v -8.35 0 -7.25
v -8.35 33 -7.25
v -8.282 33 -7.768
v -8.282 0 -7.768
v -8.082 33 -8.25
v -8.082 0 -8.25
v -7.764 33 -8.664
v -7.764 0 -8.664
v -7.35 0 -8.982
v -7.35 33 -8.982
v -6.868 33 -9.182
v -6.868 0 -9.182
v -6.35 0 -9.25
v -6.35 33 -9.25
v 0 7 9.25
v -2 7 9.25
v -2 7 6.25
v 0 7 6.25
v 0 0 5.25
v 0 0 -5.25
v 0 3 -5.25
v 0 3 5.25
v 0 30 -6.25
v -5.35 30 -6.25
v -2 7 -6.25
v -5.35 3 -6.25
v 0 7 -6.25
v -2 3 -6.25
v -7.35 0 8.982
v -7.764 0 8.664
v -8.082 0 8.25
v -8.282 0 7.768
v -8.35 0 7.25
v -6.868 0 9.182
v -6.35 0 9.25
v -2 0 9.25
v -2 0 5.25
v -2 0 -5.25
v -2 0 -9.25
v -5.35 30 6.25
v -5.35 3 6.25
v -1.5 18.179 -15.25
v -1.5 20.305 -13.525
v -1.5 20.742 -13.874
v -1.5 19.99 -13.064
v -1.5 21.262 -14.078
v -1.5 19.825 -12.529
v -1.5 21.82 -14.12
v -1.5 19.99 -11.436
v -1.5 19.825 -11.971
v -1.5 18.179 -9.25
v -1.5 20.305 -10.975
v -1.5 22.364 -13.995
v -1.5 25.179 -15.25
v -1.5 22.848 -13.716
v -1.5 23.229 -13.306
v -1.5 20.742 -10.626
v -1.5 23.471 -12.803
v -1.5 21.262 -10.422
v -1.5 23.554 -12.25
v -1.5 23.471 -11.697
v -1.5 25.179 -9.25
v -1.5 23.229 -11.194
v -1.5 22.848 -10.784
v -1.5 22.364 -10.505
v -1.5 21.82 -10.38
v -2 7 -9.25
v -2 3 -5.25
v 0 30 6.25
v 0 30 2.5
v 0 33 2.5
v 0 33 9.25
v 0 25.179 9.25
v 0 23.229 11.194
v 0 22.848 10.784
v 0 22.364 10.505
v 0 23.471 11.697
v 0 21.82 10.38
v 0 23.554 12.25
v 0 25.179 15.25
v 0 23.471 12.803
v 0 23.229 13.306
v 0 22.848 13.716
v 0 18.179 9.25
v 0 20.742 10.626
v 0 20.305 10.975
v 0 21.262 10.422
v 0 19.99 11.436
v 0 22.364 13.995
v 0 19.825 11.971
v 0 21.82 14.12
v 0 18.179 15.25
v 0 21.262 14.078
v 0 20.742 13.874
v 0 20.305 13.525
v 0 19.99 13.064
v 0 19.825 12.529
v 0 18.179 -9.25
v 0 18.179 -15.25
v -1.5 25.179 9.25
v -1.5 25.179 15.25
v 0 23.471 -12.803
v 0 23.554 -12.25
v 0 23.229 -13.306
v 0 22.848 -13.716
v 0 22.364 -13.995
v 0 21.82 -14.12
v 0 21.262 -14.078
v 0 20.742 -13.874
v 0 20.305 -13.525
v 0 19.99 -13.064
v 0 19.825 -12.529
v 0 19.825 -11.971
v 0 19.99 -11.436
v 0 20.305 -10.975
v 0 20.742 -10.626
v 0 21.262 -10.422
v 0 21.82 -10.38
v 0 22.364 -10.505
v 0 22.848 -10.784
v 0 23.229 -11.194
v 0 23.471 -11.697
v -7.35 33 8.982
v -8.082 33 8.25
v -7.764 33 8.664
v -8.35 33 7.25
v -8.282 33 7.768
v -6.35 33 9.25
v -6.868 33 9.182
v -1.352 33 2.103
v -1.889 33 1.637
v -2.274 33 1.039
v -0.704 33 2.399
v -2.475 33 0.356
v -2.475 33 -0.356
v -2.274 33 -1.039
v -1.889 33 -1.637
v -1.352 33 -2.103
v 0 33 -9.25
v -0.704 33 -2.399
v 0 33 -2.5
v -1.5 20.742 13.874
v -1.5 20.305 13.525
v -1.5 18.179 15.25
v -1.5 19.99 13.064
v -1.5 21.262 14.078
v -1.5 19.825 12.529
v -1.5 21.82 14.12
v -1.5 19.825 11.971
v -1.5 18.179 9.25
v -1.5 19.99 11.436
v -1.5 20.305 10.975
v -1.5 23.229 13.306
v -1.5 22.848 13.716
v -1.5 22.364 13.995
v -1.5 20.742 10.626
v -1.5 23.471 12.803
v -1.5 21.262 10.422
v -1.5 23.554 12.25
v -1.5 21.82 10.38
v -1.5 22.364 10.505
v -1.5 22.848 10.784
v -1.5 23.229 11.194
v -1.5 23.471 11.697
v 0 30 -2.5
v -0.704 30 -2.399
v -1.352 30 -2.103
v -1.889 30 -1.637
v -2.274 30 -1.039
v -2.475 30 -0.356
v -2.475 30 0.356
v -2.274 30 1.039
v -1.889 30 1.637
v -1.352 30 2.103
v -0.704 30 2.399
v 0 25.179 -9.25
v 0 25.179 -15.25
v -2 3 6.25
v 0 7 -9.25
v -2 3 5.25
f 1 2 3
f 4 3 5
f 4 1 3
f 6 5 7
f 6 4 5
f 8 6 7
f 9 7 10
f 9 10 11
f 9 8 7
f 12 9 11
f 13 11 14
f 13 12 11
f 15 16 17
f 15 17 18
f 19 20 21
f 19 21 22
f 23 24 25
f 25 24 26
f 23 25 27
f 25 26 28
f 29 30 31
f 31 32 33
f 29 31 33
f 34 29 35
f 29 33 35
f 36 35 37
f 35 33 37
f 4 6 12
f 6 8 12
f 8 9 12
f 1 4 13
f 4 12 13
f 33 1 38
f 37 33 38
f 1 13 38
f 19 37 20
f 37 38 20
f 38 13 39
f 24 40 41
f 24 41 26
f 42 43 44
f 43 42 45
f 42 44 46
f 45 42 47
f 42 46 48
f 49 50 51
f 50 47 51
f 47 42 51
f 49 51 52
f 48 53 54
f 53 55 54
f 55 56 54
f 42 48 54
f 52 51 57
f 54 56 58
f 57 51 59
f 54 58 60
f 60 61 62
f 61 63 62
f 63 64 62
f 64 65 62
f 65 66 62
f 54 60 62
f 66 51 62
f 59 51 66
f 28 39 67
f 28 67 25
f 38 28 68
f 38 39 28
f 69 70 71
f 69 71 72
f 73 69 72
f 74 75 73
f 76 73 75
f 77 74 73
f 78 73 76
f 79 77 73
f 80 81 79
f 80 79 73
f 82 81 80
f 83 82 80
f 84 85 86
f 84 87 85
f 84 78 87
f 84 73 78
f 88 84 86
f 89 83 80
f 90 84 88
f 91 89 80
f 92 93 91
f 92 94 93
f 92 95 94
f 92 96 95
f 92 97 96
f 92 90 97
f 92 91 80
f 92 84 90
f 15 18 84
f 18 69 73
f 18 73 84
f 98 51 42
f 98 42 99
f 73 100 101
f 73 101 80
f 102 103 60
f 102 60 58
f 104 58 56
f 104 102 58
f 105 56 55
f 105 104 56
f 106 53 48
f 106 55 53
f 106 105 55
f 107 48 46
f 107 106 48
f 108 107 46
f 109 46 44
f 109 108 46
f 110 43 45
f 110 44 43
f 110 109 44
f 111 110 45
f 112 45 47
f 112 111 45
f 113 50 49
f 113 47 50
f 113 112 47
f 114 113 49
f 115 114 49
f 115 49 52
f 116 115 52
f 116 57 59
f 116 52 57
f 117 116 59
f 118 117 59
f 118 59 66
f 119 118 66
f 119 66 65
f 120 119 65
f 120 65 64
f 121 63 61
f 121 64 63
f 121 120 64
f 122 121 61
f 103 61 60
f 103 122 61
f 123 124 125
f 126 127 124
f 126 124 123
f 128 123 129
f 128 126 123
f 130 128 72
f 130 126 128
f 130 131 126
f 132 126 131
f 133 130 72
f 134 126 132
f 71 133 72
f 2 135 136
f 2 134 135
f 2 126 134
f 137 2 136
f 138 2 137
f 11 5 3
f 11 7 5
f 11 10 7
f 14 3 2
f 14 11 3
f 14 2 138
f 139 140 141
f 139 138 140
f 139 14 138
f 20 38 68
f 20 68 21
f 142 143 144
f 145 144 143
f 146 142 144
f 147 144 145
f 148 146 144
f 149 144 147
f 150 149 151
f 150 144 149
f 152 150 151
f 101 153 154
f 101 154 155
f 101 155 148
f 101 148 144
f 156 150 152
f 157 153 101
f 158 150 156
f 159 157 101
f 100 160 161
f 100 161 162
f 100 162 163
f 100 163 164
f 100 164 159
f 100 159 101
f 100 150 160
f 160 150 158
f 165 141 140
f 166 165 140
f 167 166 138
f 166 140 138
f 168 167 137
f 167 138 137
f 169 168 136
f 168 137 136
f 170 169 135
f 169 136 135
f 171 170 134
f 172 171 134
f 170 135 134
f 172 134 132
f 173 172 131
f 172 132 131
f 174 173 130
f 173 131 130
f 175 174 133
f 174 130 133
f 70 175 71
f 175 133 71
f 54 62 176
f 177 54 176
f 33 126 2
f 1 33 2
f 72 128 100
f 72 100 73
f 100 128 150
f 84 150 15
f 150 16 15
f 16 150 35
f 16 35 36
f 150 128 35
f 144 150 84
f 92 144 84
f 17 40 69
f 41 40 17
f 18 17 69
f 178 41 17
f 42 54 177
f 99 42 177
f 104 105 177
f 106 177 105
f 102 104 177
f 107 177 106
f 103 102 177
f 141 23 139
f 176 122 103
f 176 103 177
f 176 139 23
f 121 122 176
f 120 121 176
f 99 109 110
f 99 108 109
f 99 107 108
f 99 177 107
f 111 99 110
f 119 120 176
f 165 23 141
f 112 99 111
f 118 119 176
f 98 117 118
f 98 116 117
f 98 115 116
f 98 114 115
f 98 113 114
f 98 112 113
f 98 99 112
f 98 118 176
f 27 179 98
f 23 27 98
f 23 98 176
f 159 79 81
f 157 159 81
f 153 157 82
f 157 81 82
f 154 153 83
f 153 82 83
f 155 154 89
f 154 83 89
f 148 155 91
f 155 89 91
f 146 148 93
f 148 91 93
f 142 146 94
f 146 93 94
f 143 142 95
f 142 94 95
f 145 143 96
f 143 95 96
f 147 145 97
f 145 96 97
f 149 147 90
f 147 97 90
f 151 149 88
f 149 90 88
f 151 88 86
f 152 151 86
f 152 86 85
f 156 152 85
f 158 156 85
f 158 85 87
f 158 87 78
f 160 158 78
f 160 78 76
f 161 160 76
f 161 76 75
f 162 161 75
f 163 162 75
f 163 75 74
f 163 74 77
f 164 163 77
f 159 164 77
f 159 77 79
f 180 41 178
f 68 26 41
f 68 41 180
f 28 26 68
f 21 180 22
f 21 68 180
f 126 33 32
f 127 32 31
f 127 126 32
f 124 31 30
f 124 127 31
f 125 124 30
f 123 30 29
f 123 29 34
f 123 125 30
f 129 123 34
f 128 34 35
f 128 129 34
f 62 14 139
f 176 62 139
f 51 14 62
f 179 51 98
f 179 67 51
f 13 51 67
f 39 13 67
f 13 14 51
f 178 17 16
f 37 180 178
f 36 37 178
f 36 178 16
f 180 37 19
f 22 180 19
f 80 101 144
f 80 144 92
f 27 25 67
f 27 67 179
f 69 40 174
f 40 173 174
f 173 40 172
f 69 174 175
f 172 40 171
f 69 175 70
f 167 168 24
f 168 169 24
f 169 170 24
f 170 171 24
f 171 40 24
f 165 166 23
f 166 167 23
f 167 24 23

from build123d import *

# Parameters (mm, degrees)
SKETCH1_W           = 16.7
SKETCH1_H           = 18.5
BOSS_EXTRUDE1_DEPTH = 3
SKETCH2_W           = 16.7
SKETCH2_H           = 18.5
SKETCH2_W_2         = 10.7
SKETCH2_H_2         = 12.5
BOSS_EXTRUDE2_DEPTH = 27
SKETCH7_W           = 4
SKETCH7_H           = 8
CUT_EXTRUDE1_DEPTH  = 7
SKETCH9_W           = 16.7
SKETCH9_H           = 18.5
BOSS_EXTRUDE3_DEPTH = 3
SKETCH10_R          = 2.5
CUT_EXTRUDE2_DEPTH  = 3
FILLET1_R           = 2
SKETCH11_W          = 3
SKETCH11_H          = 7
BOSS_EXTRUDE4_DEPTH = 6
SKETCH12_R          = 1.875
CUT_EXTRUDE3_DEPTH  = 6
CUT_EXTRUDE4_START  = -33
CUT_EXTRUDE4_DEPTH  = 33


# Read off the part's stored shape, not the designer's step: Cut-Extrude4
with BuildPart() as part:
    # Sketch1 → Boss-Extrude1 (new body)
    with BuildSketch(Plane(origin=(0, 0, 0), x_dir=(1, 0, 0), z_dir=(0, 1, 0))):
        Rectangle(SKETCH1_W, SKETCH1_H)
    extrude(amount=BOSS_EXTRUDE1_DEPTH)

    # Sketch2 → Boss-Extrude2 (add)
    with BuildSketch(Plane(origin=(0, 3, 0), x_dir=(1, 0, 0), z_dir=(0, 1, 0))):
        Rectangle(SKETCH2_W, SKETCH2_H)
        Rectangle(SKETCH2_W_2, SKETCH2_H_2, mode=Mode.SUBTRACT)
    extrude(amount=BOSS_EXTRUDE2_DEPTH)

    # Sketch7 → Cut-Extrude1 (cut)
    with BuildSketch(Plane.XZ):
        with Locations((0, 9.25)):
            Rectangle(SKETCH7_W, SKETCH7_H)
        with Locations((0, -9.25)):
            Rectangle(SKETCH7_W, SKETCH7_H)
    extrude(amount=-CUT_EXTRUDE1_DEPTH, mode=Mode.SUBTRACT)

    # Sketch9 → Boss-Extrude3 (add)
    with BuildSketch(Plane(origin=(0, 30, 0), x_dir=(1, 0, 0), z_dir=(0, 1, 0))):
        Rectangle(SKETCH9_W, SKETCH9_H)
    extrude(amount=BOSS_EXTRUDE3_DEPTH)

    # Sketch10 → Cut-Extrude2 (cut)
    with BuildSketch(Plane(origin=(0, 33, 0), x_dir=(1, 0, 0), z_dir=(0, 1, 0))):
        with Locations(Location((0, 0, 0), (0, 0, 270))):
            Circle(SKETCH10_R)
    extrude(amount=-CUT_EXTRUDE2_DEPTH, mode=Mode.SUBTRACT)

    # Fillet1
    fillet1_edges = [part.edges().sort_by_distance(p)[0] for p in [
        (8.35, 16.5, 9.25),
        (-8.35, 16.5, 9.25),
        (-8.35, 16.5, -9.25),
        (8.35, 16.5, -9.25),
    ]]
    fillet(fillet1_edges, radius=FILLET1_R)

    # Sketch11 → Boss-Extrude4 (add)
    with BuildSketch(Plane.XY.offset(9.25)):
        with Locations((0, 21.679413475)):
            Rectangle(SKETCH11_W, SKETCH11_H)
    boss_extrude4 = extrude(amount=BOSS_EXTRUDE4_DEPTH)

    # Sketch12 → Cut-Extrude3 (cut)
    with BuildSketch(Plane(origin=(1.5, 0, 0), x_dir=(0, 0, -1), z_dir=(1, 0, 0))):
        with Locations(Location((-12.25, 21.679413475, 0), (0, 0, 90))):
            Circle(SKETCH12_R)
    cut_extrude3 = extrude(amount=-CUT_EXTRUDE3_DEPTH, mode=Mode.SUBTRACT)

    # Mirror1: Boss-Extrude4, Cut-Extrude3 across plane
    add(boss_extrude4.mirror(Plane.XY))
    add(cut_extrude3.mirror(Plane.XY), mode=Mode.SUBTRACT)

    # Cut-Extrude4 outline → Cut-Extrude4 (cut)
    with BuildSketch(Plane(origin=(0, 33, 0), x_dir=(1, 0, 0), z_dir=(0, 1, 0)).offset(CUT_EXTRUDE4_START)):
        with BuildLine():
            Line((0, -15.25), (1.5, -15.25))
            Line((1.5, -15.25), (1.5, -9.25))
            Line((1.5, -9.25), (6.35, -9.25))
            ThreePointArc((6.35, -9.25), (7.764213562, -8.664213562), (8.35, -7.25))
            Line((8.35, -7.25), (8.35, 7.25))
            ThreePointArc((8.35, 7.25), (7.764213562, 8.664213562), (6.35, 9.25))
            Line((6.35, 9.25), (1.5, 9.25))
            Line((1.5, 9.25), (1.5, 15.25))
            Line((1.5, 15.25), (0, 15.25))
            Line((0, 15.25), (0, -15.25))
        make_face()
    extrude(amount=CUT_EXTRUDE4_DEPTH, mode=Mode.SUBTRACT)


solid = part.part
